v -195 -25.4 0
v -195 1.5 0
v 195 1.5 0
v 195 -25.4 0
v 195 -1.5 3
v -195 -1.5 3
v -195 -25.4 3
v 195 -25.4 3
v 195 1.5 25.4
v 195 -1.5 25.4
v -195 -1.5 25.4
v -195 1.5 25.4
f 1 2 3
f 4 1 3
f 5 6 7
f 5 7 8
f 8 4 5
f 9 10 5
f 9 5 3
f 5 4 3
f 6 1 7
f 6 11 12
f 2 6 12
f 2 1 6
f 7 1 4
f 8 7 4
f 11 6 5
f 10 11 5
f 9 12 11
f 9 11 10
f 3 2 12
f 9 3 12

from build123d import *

# Parameters (mm, degrees)
CROQUIS1_W              = 390
CROQUIS1_H              = 50.8
SALIENTE_EXTRUIR1_DEPTH = 3
CROQUIS2_W              = 390
CROQUIS2_H              = 3
SALIENTE_EXTRUIR2_DEPTH = 47.8
CROQUIS3_W              = 3
CROQUIS3_H              = 23.9
CORTAR_EXTRUIR1_DEPTH   = 390
CORTAR_EXTRUIR2_REACH   = 205.296
CROQUIS4_W              = 390
CROQUIS4_H              = 25.4


with BuildPart() as part:
    # Croquis1 → Saliente-Extruir1 (new body)
    with BuildSketch(Plane.XY):
        Rectangle(CROQUIS1_W, CROQUIS1_H)
    extrude(amount=SALIENTE_EXTRUIR1_DEPTH)

    # Croquis2 → Saliente-Extruir2 (add)
    with BuildSketch(Plane.XY.offset(3)):
        Rectangle(CROQUIS2_W, CROQUIS2_H)
    extrude(amount=SALIENTE_EXTRUIR2_DEPTH)

    # Croquis3 → Cortar-Extruir1 (cut)
    with BuildSketch(Plane.ZY.offset(195)):
        with Locations((1.5, 13.45)):
            Rectangle(CROQUIS3_W, CROQUIS3_H)
    extrude(amount=-CORTAR_EXTRUIR1_DEPTH, mode=Mode.SUBTRACT)

    # Croquis4 → Cortar-Extruir2 (cut, up to next)
    with BuildSketch(Plane(origin=(0, 1.5, 0), x_dir=(1, 0, 0), z_dir=(0, 1, 0)), mode=Mode.PRIVATE) as cortar_extruir2_sk1:
        with Locations((0, -38.1)):
            Rectangle(CROQUIS4_W, CROQUIS4_H)
    cortar_extruir2_tool1 = extrude(cortar_extruir2_sk1.sketch, amount=-CORTAR_EXTRUIR2_REACH, mode=Mode.PRIVATE) & part.part
    add(cortar_extruir2_tool1.solids().sort_by_distance((0, 1.5, 38.1))[0], mode=Mode.SUBTRACT)


solid = part.part
